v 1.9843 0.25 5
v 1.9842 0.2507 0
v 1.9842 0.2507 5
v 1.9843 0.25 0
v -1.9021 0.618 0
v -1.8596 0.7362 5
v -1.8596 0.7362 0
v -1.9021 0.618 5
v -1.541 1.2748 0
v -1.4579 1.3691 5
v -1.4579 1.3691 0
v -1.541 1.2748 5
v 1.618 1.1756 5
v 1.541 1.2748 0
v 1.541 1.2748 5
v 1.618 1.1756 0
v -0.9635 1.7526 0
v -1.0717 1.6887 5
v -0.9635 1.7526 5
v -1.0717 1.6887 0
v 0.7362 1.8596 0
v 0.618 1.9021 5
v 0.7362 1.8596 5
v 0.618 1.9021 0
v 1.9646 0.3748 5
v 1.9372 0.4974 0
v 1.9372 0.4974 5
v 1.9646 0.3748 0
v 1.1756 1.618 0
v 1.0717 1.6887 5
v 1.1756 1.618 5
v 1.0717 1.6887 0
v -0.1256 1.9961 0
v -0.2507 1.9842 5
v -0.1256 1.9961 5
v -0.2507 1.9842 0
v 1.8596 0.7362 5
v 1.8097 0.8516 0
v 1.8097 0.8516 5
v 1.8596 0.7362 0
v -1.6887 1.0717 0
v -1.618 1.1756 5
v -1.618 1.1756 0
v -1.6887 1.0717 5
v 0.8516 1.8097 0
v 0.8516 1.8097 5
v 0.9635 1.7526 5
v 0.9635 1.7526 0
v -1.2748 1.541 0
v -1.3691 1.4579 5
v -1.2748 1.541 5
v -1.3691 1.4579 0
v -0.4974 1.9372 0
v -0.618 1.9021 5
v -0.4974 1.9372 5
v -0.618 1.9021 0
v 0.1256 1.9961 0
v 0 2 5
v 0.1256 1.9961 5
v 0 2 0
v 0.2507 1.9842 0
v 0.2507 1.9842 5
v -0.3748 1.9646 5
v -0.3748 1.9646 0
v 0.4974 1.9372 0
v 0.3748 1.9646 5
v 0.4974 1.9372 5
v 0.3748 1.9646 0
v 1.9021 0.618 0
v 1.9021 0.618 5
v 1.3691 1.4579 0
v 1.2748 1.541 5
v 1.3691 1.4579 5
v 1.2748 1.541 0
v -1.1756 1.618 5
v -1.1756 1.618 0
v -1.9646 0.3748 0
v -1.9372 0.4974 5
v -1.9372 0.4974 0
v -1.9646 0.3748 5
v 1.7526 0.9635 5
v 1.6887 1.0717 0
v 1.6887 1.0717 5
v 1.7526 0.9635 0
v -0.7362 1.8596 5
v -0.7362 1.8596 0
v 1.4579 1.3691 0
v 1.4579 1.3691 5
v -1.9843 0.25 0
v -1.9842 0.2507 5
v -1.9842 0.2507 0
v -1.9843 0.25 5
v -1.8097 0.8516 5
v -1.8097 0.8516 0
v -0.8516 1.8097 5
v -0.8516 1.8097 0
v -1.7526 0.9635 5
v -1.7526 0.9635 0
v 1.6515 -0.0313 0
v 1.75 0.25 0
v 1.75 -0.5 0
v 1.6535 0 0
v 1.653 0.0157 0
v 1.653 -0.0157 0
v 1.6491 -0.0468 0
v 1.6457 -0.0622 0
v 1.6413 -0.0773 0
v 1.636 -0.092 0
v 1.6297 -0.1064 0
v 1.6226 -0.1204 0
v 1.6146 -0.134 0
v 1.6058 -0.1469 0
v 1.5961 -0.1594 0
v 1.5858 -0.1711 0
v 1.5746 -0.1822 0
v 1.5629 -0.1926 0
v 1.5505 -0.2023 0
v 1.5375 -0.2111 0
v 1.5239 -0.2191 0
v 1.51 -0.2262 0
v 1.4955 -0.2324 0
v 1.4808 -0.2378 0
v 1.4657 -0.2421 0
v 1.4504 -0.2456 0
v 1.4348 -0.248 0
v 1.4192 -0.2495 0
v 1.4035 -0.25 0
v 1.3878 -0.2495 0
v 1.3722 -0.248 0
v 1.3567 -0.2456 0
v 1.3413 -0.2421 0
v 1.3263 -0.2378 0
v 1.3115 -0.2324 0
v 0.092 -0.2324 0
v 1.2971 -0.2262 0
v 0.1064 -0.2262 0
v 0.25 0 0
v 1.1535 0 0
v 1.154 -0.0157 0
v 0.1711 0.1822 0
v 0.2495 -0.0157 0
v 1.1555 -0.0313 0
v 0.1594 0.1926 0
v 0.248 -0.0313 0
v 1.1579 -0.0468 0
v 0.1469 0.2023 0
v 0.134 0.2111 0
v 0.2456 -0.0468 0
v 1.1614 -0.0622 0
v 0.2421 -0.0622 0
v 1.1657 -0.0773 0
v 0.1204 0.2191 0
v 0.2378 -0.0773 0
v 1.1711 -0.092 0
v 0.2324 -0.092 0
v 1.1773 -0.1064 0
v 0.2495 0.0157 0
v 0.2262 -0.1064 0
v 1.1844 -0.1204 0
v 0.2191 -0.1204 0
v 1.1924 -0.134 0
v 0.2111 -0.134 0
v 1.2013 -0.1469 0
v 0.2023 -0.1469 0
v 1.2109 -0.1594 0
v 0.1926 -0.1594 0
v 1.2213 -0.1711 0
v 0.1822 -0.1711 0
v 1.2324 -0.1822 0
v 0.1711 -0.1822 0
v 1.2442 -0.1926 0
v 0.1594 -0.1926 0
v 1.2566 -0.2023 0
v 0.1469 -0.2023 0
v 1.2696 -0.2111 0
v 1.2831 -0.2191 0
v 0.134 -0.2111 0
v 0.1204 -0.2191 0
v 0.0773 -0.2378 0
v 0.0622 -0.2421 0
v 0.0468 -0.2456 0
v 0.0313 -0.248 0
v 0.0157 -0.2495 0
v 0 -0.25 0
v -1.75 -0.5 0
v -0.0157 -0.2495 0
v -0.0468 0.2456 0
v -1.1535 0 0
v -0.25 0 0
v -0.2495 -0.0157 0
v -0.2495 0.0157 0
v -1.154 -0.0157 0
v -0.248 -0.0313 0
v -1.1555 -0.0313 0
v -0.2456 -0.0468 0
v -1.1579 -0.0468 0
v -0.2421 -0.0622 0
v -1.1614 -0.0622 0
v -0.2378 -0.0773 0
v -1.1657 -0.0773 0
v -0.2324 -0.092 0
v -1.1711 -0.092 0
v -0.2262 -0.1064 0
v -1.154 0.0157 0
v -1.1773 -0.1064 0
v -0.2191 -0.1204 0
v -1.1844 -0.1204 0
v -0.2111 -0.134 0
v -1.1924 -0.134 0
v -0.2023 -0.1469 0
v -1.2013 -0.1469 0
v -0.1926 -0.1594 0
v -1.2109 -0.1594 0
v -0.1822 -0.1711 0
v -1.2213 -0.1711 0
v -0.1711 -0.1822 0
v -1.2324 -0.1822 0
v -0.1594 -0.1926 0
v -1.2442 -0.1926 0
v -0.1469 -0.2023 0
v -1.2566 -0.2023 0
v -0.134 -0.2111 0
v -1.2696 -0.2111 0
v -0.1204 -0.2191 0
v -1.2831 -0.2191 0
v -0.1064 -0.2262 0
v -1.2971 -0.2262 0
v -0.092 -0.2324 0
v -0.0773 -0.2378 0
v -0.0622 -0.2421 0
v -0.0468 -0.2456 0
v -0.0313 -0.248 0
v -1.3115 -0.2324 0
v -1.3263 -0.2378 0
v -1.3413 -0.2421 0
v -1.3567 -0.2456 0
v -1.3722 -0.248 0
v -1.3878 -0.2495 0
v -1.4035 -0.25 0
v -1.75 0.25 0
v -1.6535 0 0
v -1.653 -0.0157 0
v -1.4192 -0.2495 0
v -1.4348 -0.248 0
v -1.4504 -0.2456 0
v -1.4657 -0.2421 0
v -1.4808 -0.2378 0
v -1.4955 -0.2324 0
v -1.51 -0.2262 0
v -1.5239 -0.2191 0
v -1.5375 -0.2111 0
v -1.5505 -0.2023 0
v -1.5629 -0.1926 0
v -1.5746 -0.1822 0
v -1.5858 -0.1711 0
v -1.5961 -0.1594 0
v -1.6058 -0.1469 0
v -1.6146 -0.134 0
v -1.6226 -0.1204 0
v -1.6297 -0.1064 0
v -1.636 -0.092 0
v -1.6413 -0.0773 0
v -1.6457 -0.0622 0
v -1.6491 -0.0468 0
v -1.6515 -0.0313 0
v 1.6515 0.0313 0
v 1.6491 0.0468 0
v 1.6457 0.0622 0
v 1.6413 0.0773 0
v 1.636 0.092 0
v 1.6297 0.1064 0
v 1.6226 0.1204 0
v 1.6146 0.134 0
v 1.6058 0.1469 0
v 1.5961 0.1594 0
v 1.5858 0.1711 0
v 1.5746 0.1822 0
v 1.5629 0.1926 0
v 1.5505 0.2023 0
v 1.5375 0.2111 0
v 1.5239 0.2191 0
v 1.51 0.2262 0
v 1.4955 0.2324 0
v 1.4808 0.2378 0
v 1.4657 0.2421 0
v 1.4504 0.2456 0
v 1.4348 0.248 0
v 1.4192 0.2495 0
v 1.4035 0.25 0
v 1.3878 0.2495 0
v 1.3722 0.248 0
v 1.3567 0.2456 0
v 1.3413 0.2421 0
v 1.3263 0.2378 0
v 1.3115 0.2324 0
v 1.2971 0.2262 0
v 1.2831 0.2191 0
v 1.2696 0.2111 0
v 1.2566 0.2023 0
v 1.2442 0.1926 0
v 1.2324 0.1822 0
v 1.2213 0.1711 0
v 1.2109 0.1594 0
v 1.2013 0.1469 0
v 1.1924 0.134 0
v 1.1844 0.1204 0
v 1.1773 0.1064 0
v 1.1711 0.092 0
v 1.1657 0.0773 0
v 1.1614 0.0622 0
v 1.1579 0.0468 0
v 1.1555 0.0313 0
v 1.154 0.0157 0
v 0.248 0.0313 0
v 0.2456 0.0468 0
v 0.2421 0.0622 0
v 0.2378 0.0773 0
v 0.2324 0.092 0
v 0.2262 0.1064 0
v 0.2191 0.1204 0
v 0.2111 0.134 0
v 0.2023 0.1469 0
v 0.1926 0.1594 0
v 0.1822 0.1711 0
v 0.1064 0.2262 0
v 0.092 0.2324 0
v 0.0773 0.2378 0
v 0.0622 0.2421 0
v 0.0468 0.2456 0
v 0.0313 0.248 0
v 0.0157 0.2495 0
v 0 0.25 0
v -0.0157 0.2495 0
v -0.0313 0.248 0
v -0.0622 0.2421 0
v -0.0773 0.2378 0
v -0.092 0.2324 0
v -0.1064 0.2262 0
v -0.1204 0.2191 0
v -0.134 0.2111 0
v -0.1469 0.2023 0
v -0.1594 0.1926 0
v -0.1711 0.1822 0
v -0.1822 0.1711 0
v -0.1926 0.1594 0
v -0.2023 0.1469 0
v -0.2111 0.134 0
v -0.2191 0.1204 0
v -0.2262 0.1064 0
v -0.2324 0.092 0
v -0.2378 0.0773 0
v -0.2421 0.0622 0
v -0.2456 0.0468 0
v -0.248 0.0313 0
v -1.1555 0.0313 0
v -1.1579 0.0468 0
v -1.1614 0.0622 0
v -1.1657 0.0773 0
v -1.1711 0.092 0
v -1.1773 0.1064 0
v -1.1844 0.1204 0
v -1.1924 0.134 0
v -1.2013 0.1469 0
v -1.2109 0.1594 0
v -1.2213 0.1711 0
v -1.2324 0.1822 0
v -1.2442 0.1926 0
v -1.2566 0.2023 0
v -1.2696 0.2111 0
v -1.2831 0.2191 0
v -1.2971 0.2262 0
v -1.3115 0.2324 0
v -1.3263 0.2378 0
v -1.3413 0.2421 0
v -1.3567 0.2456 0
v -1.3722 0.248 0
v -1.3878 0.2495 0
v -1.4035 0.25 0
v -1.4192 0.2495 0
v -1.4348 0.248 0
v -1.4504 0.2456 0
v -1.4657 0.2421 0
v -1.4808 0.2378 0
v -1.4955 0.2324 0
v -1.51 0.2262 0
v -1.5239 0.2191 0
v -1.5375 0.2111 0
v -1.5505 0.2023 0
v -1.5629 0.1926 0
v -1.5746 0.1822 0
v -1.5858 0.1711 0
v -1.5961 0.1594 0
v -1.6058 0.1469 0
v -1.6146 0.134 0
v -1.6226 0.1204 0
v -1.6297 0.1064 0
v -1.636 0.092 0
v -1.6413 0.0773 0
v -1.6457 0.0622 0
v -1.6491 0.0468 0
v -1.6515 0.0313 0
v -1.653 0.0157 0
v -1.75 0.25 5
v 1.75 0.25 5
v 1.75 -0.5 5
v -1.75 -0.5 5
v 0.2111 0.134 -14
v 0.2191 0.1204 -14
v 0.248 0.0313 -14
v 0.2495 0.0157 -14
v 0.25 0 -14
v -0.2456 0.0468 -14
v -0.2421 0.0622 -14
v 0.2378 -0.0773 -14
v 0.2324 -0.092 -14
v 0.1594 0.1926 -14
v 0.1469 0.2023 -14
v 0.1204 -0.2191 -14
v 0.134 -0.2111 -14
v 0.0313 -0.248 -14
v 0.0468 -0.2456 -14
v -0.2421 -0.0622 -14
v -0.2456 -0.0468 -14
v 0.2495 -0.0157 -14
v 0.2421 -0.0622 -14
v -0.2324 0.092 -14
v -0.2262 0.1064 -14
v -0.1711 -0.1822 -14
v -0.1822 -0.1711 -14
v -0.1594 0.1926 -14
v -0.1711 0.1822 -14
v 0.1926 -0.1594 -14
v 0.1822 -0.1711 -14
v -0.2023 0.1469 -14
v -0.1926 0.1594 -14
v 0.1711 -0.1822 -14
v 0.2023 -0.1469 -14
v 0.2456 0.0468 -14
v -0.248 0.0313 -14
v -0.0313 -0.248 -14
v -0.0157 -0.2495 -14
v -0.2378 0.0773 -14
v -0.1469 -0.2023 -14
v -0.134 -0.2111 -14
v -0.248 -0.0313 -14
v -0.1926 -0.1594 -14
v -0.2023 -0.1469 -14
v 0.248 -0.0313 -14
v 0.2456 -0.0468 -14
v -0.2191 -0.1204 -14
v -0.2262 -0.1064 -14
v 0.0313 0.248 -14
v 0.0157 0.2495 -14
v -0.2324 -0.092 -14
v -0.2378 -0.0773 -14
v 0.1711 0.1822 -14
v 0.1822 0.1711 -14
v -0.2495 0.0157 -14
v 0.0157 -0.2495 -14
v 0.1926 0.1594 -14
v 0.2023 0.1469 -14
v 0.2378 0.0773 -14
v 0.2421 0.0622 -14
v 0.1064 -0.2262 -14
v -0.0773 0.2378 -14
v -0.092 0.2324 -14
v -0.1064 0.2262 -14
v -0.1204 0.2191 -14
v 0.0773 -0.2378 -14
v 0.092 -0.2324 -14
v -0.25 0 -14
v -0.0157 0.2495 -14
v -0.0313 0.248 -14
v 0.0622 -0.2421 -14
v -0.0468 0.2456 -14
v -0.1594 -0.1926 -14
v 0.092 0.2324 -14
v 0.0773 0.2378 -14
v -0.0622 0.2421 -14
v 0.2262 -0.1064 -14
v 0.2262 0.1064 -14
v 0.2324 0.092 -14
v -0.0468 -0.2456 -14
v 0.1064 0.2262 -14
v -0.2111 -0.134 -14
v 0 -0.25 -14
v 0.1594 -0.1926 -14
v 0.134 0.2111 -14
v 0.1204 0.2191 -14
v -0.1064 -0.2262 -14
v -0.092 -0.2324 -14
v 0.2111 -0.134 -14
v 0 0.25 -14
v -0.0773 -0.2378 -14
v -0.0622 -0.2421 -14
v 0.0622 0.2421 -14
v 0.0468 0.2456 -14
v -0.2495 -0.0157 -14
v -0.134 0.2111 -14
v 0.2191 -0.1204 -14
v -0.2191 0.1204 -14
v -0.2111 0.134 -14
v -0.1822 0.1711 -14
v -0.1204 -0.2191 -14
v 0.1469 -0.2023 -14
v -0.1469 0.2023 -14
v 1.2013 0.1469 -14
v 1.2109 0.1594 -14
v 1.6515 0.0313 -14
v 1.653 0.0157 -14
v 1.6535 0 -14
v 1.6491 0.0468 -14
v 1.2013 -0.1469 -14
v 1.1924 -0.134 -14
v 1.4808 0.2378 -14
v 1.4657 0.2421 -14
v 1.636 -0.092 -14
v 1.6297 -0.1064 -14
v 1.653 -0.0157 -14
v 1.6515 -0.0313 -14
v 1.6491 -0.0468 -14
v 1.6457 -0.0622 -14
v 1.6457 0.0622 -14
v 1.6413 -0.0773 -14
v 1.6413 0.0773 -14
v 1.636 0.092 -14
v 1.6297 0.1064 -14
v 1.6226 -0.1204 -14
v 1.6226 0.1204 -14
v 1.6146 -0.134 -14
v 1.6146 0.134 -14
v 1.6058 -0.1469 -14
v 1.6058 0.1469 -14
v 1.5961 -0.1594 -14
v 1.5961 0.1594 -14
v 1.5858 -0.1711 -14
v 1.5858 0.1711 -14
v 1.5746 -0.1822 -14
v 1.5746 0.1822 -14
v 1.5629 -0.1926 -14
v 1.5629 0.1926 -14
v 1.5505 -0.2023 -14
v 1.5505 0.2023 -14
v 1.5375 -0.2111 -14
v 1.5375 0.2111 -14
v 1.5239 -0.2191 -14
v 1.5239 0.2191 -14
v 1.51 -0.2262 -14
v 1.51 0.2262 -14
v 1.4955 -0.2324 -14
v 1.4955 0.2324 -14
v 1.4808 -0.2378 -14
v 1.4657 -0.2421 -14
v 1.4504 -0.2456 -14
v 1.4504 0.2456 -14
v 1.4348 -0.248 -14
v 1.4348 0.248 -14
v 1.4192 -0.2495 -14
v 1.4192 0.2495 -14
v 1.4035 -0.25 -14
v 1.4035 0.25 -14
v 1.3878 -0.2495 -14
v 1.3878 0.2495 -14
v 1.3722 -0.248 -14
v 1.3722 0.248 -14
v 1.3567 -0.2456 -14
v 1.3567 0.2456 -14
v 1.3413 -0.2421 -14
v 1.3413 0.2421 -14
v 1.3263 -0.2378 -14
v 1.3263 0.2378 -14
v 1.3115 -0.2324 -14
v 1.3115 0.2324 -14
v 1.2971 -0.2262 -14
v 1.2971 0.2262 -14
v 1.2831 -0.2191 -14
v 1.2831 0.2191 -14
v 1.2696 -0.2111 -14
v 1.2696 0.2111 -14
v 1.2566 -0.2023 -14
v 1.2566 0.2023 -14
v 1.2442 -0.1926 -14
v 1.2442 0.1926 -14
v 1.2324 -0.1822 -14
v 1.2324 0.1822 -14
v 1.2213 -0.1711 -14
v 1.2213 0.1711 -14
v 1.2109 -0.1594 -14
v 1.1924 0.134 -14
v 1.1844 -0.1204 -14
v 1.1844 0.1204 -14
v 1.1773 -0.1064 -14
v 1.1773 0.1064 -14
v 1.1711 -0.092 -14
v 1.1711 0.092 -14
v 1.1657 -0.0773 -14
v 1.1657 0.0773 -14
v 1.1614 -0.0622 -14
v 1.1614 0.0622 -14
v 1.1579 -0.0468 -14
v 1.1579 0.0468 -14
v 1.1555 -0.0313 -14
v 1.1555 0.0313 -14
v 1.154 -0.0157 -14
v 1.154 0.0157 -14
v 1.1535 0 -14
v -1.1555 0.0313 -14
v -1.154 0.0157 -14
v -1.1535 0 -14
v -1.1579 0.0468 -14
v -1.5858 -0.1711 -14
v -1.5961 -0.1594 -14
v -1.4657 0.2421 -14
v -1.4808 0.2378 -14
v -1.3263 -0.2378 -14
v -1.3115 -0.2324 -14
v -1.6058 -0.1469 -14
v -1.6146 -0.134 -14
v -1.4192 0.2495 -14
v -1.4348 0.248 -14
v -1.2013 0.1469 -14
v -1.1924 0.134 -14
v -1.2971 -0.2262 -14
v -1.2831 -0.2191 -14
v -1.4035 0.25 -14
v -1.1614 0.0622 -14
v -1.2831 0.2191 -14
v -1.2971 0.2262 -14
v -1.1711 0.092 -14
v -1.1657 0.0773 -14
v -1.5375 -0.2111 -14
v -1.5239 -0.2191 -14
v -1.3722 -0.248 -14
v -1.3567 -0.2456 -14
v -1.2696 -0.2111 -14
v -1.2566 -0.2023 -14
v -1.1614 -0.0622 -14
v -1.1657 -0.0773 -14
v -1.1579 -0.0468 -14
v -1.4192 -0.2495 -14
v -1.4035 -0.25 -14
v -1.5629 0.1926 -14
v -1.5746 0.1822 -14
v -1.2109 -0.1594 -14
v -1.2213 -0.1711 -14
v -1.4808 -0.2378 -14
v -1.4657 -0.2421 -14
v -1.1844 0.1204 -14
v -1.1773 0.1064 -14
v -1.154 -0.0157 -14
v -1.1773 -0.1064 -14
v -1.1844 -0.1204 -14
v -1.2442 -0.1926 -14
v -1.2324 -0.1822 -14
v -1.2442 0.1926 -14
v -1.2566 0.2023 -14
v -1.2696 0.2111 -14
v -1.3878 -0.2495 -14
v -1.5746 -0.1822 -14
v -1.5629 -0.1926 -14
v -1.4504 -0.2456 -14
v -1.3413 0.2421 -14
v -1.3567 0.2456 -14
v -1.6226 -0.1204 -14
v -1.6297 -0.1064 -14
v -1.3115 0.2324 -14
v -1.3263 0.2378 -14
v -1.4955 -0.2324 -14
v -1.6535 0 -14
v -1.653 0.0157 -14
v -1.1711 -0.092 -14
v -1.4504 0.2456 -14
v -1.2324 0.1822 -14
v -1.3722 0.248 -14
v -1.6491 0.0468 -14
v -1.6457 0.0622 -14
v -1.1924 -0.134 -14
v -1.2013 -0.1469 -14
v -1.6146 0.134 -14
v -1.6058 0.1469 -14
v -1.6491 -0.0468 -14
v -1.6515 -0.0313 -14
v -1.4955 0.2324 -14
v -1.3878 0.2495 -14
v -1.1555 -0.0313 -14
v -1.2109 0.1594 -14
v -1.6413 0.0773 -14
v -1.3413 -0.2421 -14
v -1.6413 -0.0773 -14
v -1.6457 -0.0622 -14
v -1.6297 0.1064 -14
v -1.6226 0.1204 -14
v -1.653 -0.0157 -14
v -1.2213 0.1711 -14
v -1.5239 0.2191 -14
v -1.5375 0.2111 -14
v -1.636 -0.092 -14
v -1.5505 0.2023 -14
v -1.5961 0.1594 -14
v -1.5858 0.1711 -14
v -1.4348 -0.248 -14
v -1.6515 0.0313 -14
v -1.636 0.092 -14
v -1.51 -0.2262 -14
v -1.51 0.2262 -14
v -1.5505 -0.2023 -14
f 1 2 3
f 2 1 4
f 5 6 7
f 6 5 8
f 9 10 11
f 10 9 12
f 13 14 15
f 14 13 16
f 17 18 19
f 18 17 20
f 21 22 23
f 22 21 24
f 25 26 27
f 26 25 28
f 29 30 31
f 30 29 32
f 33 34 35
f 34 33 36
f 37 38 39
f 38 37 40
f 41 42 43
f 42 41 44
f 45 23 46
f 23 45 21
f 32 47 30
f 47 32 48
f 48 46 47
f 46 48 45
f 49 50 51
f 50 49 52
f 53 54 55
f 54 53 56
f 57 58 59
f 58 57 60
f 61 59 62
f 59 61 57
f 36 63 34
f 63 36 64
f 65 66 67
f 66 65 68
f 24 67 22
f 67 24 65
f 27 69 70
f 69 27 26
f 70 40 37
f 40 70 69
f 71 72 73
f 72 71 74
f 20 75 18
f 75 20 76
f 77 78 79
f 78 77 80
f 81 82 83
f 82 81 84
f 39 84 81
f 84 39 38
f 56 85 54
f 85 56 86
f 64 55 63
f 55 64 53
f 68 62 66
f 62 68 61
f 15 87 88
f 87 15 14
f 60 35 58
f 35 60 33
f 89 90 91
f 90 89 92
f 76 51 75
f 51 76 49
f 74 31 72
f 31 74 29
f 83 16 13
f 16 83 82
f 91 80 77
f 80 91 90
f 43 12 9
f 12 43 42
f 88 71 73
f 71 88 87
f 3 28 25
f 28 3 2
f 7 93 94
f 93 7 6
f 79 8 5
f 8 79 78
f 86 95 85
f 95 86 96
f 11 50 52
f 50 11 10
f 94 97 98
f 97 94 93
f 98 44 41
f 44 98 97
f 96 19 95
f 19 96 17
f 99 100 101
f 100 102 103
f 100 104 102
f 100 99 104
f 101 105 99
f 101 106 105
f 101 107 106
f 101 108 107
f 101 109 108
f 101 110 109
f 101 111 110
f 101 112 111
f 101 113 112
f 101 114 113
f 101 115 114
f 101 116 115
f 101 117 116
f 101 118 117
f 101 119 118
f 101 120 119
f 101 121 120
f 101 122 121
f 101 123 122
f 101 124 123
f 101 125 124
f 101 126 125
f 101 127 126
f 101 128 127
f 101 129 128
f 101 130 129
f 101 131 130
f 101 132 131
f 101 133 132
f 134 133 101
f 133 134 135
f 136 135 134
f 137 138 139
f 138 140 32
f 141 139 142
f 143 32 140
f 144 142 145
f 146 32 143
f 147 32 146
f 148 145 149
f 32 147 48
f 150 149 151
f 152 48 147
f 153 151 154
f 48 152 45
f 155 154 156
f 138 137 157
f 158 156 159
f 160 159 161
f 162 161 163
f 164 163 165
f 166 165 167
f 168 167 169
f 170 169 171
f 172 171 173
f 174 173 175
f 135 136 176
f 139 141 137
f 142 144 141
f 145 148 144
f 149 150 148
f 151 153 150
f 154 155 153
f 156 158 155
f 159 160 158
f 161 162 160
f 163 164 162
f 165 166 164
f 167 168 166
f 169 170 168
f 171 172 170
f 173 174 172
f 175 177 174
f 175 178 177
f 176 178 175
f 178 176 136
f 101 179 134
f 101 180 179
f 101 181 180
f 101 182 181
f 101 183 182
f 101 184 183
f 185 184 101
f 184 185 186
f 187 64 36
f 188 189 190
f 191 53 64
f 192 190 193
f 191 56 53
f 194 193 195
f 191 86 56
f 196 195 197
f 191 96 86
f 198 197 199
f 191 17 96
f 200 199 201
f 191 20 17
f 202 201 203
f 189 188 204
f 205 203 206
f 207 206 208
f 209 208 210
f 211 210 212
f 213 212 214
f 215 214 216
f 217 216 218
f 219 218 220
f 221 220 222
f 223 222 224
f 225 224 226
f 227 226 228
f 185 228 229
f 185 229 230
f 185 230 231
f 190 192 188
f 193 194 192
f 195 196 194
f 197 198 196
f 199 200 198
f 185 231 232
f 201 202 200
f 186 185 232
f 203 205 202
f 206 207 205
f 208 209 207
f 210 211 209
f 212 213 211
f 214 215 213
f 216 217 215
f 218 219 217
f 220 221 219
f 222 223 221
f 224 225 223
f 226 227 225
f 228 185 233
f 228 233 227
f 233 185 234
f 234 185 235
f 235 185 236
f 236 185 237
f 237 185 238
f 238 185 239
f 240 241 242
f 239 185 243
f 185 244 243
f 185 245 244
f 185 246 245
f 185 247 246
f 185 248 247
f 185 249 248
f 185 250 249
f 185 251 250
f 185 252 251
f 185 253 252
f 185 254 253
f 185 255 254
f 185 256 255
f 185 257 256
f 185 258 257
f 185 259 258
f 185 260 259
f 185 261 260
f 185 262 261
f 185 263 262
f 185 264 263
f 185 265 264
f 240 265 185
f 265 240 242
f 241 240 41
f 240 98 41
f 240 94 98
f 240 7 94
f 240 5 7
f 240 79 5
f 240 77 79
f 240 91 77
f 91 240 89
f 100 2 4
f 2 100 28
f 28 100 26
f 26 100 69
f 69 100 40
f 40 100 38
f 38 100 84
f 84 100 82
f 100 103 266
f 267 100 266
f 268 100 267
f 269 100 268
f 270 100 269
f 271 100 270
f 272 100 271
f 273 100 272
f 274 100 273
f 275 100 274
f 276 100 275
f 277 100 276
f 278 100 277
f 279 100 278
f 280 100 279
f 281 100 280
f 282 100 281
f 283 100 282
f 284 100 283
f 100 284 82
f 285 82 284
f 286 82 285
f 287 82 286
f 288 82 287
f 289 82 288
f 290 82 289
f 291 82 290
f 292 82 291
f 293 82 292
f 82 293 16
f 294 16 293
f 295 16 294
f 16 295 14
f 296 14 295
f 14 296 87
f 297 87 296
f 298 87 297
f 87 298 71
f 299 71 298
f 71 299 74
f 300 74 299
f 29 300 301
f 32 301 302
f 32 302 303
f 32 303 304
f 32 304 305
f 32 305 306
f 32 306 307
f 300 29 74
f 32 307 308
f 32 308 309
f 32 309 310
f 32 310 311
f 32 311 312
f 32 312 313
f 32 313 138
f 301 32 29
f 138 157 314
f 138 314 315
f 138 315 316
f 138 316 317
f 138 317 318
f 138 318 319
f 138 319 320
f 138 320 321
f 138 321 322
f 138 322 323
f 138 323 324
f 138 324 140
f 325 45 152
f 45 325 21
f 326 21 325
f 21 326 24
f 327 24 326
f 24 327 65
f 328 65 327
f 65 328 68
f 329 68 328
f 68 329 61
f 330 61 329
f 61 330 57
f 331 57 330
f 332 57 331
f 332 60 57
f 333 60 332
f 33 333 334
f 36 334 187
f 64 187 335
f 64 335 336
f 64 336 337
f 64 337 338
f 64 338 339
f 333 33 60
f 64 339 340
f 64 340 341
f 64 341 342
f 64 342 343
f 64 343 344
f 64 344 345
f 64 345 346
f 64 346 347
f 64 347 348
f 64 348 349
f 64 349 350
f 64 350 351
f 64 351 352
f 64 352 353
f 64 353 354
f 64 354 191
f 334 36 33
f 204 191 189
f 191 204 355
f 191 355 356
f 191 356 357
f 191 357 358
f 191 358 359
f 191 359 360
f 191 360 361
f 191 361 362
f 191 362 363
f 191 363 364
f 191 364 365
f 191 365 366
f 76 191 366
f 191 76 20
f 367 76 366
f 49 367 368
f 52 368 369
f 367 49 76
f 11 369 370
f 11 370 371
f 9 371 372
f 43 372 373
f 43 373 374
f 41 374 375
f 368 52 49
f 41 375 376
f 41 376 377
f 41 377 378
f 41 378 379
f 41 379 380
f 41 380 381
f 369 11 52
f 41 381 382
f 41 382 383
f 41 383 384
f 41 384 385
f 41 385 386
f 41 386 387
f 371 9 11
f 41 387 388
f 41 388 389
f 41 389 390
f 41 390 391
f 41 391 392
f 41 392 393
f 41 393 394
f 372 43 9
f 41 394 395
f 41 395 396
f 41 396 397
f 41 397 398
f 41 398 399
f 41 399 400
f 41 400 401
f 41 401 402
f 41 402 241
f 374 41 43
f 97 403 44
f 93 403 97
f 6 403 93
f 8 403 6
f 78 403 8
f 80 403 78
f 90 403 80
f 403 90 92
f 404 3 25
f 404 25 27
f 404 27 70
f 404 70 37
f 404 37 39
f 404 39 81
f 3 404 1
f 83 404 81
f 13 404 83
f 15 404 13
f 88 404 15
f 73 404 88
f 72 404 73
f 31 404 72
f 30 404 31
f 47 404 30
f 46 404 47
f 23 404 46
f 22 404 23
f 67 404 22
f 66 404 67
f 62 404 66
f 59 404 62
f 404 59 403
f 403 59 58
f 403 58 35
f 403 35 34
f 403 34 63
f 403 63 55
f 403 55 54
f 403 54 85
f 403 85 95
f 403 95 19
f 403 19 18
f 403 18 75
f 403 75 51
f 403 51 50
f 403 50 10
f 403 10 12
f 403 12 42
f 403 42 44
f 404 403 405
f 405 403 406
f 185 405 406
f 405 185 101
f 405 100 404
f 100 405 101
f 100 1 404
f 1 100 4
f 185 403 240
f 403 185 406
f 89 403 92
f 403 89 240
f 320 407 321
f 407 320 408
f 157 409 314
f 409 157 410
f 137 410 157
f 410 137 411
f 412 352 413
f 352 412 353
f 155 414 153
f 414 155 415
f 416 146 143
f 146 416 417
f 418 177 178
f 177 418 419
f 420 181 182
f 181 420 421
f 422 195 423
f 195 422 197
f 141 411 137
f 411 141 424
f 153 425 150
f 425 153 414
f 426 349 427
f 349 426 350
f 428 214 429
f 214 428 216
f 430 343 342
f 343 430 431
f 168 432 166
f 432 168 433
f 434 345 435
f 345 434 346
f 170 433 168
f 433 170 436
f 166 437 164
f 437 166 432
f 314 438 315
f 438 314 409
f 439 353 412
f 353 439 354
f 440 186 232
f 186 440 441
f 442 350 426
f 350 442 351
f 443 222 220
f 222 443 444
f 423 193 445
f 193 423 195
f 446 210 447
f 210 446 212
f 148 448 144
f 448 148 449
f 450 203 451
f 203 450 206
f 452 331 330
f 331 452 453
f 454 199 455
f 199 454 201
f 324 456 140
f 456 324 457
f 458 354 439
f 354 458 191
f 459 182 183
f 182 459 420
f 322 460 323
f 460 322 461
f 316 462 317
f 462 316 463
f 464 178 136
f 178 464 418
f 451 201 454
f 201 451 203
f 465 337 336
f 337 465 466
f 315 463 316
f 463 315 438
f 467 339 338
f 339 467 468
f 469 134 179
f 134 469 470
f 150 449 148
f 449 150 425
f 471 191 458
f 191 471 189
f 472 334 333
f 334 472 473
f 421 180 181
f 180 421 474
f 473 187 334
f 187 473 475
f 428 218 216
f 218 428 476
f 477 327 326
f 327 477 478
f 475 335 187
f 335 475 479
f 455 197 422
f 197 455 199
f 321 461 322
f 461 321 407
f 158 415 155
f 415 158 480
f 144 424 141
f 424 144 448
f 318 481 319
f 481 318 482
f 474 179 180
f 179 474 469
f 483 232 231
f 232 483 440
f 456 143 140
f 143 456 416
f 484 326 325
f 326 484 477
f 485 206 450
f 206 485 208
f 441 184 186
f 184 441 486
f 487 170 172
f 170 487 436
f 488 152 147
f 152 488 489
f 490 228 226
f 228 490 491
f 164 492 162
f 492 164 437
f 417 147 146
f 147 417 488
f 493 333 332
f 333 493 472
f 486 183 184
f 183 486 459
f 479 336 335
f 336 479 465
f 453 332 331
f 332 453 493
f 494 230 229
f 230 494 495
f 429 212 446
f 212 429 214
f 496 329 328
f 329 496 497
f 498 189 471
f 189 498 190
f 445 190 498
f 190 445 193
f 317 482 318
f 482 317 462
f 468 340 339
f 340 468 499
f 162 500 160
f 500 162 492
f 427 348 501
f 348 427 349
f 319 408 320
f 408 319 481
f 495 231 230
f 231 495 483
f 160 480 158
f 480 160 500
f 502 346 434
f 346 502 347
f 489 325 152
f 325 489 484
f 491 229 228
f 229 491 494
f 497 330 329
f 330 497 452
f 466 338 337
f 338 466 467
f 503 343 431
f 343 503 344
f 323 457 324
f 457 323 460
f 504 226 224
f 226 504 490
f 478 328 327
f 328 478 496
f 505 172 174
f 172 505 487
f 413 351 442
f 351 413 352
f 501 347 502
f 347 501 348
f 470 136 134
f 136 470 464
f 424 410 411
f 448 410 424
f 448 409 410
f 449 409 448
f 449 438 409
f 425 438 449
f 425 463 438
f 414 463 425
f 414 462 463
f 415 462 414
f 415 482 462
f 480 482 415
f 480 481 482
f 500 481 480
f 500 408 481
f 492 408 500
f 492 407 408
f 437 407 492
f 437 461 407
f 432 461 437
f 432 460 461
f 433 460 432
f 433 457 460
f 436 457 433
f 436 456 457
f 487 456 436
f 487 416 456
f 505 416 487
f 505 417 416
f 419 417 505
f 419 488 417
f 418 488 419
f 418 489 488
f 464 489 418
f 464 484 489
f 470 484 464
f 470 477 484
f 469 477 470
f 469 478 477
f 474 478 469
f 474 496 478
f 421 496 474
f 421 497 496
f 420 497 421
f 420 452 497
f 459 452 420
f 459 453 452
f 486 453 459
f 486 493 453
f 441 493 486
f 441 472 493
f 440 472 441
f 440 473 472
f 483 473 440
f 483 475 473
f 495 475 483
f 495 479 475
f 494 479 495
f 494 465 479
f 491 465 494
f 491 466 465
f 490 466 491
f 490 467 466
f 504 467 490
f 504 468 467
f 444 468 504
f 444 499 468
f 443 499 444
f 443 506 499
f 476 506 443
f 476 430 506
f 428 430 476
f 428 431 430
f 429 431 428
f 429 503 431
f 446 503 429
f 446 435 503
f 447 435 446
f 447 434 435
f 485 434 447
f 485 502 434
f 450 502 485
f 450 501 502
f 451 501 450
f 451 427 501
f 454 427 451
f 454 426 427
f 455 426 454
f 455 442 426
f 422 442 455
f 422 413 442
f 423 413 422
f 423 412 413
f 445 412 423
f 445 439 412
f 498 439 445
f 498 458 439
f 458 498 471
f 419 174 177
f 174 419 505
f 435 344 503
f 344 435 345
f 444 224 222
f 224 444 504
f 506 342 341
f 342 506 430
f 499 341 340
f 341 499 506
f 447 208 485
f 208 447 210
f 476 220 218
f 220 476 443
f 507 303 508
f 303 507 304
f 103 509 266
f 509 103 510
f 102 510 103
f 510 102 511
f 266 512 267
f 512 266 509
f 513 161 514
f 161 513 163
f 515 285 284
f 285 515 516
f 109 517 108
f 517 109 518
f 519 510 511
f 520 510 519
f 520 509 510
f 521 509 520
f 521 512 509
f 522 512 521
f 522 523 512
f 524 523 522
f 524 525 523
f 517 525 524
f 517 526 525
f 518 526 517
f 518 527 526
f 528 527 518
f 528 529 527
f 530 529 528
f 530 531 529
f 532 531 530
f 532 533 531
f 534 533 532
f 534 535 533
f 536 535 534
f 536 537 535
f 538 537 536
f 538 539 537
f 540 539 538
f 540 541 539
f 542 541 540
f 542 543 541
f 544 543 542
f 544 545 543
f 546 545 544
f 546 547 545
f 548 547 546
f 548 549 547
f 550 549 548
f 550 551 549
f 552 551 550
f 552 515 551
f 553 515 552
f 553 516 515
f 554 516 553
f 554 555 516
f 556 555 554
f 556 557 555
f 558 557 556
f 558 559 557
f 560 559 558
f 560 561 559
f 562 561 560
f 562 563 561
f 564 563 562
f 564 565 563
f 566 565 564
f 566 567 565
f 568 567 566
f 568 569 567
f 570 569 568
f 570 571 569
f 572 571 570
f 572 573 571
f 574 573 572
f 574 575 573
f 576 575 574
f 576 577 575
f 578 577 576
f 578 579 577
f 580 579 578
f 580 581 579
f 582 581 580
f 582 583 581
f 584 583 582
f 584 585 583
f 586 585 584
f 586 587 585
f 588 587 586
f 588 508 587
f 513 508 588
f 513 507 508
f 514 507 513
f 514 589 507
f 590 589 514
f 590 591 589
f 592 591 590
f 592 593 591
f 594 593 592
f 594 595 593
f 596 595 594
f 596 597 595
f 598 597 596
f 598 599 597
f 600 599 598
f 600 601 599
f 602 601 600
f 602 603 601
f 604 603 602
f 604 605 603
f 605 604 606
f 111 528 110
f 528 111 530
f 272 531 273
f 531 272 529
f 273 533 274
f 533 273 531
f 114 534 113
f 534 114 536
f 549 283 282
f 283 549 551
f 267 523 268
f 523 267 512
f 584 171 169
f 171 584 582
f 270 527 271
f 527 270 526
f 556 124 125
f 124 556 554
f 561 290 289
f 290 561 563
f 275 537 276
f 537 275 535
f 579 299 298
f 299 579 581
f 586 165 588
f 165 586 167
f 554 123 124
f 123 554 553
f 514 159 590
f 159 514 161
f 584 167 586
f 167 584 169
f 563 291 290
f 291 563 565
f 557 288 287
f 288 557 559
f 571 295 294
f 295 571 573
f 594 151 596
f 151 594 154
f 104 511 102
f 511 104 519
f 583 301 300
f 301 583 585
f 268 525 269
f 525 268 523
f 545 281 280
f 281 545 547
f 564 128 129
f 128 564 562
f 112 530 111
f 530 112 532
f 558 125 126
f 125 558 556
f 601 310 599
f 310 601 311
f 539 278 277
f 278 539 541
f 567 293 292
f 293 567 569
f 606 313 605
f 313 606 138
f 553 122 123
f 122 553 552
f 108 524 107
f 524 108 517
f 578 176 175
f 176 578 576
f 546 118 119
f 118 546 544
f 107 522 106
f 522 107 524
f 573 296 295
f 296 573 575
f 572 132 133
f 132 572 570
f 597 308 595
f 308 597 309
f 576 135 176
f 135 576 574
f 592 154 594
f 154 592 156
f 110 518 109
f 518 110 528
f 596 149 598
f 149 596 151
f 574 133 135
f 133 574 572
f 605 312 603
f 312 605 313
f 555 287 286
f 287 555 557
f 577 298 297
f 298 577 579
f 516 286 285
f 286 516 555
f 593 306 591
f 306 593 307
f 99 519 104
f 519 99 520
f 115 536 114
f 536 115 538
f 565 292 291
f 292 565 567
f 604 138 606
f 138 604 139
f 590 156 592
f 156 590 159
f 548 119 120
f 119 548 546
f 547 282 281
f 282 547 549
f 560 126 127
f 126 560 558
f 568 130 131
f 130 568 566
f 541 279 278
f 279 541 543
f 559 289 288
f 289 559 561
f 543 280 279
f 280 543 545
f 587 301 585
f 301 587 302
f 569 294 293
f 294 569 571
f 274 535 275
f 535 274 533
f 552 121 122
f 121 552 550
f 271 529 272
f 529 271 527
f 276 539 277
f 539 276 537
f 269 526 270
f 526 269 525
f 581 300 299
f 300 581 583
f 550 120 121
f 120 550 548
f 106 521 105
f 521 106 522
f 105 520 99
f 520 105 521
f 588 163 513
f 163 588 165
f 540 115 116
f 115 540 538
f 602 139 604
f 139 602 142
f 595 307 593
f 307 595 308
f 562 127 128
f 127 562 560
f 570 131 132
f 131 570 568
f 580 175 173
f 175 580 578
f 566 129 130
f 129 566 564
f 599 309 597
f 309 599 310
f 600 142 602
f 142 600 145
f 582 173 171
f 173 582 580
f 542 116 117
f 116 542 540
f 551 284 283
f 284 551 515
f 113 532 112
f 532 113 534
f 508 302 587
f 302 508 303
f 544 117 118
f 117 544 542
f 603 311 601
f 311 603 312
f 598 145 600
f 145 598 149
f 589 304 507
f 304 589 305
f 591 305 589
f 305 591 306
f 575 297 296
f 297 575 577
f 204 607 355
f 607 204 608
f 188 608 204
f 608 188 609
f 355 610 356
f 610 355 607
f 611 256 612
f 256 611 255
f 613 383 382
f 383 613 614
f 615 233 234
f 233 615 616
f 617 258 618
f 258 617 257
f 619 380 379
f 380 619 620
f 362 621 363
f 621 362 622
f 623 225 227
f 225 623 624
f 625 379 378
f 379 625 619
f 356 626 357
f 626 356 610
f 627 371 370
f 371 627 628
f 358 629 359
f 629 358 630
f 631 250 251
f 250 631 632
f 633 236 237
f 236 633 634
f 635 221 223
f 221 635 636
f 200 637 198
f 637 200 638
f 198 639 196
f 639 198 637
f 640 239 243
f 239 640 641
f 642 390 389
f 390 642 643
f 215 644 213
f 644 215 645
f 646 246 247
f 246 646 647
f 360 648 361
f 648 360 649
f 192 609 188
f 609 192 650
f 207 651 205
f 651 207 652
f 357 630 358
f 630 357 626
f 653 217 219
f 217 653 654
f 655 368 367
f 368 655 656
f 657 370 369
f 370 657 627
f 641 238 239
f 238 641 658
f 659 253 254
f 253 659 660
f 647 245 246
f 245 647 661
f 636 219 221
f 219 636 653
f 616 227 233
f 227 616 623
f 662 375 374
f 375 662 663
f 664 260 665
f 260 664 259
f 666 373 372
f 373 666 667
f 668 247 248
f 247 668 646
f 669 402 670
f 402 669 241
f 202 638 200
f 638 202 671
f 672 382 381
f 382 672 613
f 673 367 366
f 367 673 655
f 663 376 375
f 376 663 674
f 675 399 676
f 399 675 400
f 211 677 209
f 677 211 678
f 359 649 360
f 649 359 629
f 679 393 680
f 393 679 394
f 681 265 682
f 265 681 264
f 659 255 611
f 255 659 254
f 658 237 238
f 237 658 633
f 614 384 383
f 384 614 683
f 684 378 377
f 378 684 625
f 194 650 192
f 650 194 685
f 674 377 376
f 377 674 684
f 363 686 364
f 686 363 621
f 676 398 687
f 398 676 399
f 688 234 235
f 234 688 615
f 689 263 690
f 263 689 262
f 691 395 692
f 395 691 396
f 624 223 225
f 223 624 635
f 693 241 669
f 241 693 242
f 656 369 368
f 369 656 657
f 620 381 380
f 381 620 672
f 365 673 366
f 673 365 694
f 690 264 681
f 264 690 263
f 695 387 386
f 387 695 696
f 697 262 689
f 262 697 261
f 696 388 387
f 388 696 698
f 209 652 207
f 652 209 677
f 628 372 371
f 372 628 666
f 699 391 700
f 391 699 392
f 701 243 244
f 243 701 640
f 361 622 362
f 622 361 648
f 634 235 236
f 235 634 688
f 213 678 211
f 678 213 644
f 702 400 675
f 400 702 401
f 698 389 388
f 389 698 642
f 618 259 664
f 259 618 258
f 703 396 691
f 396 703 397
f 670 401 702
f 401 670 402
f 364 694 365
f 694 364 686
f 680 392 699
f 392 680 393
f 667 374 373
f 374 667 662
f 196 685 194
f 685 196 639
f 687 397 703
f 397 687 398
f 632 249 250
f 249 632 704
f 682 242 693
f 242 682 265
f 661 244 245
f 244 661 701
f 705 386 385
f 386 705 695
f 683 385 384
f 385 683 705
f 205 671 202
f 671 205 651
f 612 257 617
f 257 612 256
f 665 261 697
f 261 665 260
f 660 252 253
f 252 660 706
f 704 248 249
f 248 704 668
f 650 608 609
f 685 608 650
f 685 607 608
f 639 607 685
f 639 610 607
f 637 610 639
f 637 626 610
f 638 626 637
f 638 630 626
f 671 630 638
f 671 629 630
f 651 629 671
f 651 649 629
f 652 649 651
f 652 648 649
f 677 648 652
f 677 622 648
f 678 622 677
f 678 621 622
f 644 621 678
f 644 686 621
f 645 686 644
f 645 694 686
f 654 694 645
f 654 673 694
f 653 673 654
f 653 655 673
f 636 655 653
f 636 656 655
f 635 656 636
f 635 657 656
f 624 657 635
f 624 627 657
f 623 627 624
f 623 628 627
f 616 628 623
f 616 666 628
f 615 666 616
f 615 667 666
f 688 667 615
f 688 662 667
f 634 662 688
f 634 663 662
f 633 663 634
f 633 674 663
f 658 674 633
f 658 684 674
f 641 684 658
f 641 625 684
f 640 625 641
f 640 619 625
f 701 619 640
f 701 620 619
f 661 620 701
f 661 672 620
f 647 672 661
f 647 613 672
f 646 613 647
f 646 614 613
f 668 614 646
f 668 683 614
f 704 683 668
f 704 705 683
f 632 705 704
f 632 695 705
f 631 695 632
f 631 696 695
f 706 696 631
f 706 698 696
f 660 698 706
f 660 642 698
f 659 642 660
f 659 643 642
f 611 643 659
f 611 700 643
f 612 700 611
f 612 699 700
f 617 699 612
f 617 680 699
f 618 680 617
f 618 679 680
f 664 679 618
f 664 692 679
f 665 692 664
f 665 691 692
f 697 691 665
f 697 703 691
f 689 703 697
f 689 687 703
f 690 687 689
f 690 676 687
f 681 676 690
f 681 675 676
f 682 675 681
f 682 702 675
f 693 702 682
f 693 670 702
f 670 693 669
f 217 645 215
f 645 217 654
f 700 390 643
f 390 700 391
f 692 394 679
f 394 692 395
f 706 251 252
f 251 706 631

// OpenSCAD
// Units in mm.
diode_diameter = 4;
diode_height = 5;
cutoutf_y=1.5;
cutoutf_x = diode_diameter/2;
cutoutf_ys = diode_diameter - cutoutf_x;
cutouts_x = 0.25;
cutouts_y = diode_diameter;
cutouts_ys = diode_diameter - cutouts_x;
pindiameter=0.25;
pinheight=3.5*diode_diameter;
pinoffsetx = diode_diameter/2.85;
ff=0.1;    // fudge factor

color([0.45,0.45,0.45]) {
difference() {
  difference() {
    difference() {
      cylinder(r=diode_diameter/2, h=diode_height, $fn=100);
      translate([-cutoutf_x, -cutoutf_ys, -ff/2]) cube([diode_diameter, cutoutf_y, diode_height+ff]);
    }
    translate([(diode_diameter/2)-cutouts_x,-cutouts_ys, -ff/2]) cube([cutouts_x, cutouts_y, diode_height+ff]);
  }
  translate([(-diode_diameter/2),-cutouts_ys, -ff/2]) cube([cutouts_x, cutouts_y, diode_height+ff]);
}
}

 color([0.95,0.95,0.95]) {
  translate([0,0,-pinheight]) cylinder(r=pindiameter, h=pinheight, $fn=100);
  translate([pinoffsetx,0,-pinheight]) cylinder(r=pindiameter, h=pinheight, $fn=100);
 translate([-pinoffsetx,0,-pinheight]) cylinder(r=pindiameter, h=pinheight, $fn=100);   
}
